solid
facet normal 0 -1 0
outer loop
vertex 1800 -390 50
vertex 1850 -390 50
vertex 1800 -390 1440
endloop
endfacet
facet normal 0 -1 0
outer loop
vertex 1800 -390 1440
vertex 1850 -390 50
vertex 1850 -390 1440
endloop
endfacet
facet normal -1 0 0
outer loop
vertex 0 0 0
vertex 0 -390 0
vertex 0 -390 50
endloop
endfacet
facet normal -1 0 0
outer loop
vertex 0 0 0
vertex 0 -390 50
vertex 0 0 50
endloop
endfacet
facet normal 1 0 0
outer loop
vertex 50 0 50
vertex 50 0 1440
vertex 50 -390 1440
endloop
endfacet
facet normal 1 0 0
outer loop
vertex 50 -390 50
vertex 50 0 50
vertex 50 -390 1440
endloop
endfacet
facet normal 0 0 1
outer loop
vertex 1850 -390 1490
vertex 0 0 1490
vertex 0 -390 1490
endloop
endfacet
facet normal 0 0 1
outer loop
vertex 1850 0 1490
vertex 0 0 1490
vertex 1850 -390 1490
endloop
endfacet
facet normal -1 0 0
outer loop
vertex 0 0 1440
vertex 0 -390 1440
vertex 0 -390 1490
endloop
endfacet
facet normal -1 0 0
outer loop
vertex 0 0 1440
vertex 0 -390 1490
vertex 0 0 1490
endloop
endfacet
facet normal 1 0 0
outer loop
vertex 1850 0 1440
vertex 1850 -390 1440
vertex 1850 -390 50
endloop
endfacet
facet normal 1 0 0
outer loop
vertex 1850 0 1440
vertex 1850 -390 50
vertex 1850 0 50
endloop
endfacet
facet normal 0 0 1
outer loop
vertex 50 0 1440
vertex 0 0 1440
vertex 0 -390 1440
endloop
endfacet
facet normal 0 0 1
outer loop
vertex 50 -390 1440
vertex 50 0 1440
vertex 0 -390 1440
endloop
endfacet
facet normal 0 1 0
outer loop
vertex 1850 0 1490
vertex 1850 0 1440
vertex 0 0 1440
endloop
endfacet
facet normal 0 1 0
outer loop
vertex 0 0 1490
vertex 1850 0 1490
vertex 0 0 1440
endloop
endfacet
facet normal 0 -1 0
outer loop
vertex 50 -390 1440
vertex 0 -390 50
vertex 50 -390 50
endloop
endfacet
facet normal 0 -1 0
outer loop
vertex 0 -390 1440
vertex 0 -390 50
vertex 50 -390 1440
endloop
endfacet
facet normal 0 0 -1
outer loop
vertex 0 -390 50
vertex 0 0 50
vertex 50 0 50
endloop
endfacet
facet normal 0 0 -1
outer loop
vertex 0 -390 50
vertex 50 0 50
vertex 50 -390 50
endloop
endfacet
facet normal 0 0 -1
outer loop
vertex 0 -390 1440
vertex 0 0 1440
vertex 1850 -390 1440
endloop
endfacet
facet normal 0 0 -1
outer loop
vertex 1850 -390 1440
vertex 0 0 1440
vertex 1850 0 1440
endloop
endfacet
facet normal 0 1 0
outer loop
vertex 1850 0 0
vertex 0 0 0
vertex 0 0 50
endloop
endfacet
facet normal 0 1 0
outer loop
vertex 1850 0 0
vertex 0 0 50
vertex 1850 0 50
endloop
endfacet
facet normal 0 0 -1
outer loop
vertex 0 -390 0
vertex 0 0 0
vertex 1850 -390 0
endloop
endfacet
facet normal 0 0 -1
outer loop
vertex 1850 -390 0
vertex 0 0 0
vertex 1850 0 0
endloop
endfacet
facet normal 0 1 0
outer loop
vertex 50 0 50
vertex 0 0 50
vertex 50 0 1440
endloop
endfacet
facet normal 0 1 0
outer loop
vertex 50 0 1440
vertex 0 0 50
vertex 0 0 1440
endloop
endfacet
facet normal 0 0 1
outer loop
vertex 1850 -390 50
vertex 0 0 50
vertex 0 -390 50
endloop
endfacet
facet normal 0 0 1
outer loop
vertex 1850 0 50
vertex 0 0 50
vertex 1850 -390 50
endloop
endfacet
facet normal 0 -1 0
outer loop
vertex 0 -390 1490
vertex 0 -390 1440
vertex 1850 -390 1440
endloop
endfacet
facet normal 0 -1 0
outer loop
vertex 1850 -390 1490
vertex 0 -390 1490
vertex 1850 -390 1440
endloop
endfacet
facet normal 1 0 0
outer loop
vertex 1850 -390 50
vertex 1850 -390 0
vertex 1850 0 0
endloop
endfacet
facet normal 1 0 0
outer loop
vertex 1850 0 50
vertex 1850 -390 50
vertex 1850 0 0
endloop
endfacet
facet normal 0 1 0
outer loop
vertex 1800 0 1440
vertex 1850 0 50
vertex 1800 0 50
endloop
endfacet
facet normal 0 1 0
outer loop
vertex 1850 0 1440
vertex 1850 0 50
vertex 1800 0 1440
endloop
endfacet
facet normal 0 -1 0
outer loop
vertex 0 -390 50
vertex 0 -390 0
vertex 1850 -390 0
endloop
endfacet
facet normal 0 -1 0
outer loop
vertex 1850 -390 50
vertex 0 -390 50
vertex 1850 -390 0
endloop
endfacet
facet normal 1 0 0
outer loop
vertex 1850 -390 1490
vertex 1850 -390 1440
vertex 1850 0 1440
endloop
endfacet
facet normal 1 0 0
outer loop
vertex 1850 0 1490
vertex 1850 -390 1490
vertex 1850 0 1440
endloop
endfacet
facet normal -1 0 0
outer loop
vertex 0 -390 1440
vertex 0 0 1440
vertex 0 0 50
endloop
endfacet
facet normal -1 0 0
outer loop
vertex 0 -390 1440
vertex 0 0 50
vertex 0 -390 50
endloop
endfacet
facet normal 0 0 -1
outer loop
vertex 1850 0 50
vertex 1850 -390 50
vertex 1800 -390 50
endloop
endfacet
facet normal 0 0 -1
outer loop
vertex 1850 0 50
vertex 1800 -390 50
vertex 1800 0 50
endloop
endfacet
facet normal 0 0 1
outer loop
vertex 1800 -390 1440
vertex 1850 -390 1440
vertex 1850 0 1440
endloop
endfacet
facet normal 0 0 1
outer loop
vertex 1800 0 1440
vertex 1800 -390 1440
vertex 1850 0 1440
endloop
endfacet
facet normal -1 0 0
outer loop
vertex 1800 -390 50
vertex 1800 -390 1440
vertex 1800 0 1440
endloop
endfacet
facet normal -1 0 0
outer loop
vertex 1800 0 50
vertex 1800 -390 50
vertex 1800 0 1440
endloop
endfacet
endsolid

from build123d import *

# Parameters (mm, degrees)
F0_W     = 1850
F0_H     = 390
F1_DEPTH = 50
F2_W     = 390
F2_H     = 1390
F3_DEPTH = 50
F4_W     = 390
F4_H     = 1390
F5_DEPTH = 50
F6_W     = 50
F6_H     = 390
F6_W_2   = 1800
F7_DEPTH = 50


with BuildPart() as f1:
    # F0 (on Top) → F1 (new body)
    with BuildSketch(Plane.XY):
        with Locations((925, -195)):
            Rectangle(F0_W, F0_H)
    extrude(amount=F1_DEPTH)


with BuildPart() as f3:
    # F2 (on face) → F3 (new body)
    with BuildSketch(Plane(origin=(0, 0, 0), x_dir=(0, -1, 0), z_dir=(-1, 0, 0))):
        with Locations((195, 745)):
            Rectangle(F2_W, F2_H)
    extrude(amount=-F3_DEPTH)


with BuildPart() as f5:
    # F4 (on face) → F5 (new body)
    with BuildSketch(Plane.YZ.offset(1850)):
        with Locations((-195, 745)):
            Rectangle(F4_W, F4_H)
    extrude(amount=-F5_DEPTH)


with BuildPart() as f7:
    # F6 (on face) → F7 (new body)
    with BuildSketch(Plane.XY.offset(1440)):
        with Locations((25, -195)):
            Rectangle(F6_W, F6_H)
        with Locations((950, -195)):
            Rectangle(F6_W_2, F6_H)
    extrude(amount=F7_DEPTH)


solid = Compound([f1.part, f3.part, f5.part, f7.part])
